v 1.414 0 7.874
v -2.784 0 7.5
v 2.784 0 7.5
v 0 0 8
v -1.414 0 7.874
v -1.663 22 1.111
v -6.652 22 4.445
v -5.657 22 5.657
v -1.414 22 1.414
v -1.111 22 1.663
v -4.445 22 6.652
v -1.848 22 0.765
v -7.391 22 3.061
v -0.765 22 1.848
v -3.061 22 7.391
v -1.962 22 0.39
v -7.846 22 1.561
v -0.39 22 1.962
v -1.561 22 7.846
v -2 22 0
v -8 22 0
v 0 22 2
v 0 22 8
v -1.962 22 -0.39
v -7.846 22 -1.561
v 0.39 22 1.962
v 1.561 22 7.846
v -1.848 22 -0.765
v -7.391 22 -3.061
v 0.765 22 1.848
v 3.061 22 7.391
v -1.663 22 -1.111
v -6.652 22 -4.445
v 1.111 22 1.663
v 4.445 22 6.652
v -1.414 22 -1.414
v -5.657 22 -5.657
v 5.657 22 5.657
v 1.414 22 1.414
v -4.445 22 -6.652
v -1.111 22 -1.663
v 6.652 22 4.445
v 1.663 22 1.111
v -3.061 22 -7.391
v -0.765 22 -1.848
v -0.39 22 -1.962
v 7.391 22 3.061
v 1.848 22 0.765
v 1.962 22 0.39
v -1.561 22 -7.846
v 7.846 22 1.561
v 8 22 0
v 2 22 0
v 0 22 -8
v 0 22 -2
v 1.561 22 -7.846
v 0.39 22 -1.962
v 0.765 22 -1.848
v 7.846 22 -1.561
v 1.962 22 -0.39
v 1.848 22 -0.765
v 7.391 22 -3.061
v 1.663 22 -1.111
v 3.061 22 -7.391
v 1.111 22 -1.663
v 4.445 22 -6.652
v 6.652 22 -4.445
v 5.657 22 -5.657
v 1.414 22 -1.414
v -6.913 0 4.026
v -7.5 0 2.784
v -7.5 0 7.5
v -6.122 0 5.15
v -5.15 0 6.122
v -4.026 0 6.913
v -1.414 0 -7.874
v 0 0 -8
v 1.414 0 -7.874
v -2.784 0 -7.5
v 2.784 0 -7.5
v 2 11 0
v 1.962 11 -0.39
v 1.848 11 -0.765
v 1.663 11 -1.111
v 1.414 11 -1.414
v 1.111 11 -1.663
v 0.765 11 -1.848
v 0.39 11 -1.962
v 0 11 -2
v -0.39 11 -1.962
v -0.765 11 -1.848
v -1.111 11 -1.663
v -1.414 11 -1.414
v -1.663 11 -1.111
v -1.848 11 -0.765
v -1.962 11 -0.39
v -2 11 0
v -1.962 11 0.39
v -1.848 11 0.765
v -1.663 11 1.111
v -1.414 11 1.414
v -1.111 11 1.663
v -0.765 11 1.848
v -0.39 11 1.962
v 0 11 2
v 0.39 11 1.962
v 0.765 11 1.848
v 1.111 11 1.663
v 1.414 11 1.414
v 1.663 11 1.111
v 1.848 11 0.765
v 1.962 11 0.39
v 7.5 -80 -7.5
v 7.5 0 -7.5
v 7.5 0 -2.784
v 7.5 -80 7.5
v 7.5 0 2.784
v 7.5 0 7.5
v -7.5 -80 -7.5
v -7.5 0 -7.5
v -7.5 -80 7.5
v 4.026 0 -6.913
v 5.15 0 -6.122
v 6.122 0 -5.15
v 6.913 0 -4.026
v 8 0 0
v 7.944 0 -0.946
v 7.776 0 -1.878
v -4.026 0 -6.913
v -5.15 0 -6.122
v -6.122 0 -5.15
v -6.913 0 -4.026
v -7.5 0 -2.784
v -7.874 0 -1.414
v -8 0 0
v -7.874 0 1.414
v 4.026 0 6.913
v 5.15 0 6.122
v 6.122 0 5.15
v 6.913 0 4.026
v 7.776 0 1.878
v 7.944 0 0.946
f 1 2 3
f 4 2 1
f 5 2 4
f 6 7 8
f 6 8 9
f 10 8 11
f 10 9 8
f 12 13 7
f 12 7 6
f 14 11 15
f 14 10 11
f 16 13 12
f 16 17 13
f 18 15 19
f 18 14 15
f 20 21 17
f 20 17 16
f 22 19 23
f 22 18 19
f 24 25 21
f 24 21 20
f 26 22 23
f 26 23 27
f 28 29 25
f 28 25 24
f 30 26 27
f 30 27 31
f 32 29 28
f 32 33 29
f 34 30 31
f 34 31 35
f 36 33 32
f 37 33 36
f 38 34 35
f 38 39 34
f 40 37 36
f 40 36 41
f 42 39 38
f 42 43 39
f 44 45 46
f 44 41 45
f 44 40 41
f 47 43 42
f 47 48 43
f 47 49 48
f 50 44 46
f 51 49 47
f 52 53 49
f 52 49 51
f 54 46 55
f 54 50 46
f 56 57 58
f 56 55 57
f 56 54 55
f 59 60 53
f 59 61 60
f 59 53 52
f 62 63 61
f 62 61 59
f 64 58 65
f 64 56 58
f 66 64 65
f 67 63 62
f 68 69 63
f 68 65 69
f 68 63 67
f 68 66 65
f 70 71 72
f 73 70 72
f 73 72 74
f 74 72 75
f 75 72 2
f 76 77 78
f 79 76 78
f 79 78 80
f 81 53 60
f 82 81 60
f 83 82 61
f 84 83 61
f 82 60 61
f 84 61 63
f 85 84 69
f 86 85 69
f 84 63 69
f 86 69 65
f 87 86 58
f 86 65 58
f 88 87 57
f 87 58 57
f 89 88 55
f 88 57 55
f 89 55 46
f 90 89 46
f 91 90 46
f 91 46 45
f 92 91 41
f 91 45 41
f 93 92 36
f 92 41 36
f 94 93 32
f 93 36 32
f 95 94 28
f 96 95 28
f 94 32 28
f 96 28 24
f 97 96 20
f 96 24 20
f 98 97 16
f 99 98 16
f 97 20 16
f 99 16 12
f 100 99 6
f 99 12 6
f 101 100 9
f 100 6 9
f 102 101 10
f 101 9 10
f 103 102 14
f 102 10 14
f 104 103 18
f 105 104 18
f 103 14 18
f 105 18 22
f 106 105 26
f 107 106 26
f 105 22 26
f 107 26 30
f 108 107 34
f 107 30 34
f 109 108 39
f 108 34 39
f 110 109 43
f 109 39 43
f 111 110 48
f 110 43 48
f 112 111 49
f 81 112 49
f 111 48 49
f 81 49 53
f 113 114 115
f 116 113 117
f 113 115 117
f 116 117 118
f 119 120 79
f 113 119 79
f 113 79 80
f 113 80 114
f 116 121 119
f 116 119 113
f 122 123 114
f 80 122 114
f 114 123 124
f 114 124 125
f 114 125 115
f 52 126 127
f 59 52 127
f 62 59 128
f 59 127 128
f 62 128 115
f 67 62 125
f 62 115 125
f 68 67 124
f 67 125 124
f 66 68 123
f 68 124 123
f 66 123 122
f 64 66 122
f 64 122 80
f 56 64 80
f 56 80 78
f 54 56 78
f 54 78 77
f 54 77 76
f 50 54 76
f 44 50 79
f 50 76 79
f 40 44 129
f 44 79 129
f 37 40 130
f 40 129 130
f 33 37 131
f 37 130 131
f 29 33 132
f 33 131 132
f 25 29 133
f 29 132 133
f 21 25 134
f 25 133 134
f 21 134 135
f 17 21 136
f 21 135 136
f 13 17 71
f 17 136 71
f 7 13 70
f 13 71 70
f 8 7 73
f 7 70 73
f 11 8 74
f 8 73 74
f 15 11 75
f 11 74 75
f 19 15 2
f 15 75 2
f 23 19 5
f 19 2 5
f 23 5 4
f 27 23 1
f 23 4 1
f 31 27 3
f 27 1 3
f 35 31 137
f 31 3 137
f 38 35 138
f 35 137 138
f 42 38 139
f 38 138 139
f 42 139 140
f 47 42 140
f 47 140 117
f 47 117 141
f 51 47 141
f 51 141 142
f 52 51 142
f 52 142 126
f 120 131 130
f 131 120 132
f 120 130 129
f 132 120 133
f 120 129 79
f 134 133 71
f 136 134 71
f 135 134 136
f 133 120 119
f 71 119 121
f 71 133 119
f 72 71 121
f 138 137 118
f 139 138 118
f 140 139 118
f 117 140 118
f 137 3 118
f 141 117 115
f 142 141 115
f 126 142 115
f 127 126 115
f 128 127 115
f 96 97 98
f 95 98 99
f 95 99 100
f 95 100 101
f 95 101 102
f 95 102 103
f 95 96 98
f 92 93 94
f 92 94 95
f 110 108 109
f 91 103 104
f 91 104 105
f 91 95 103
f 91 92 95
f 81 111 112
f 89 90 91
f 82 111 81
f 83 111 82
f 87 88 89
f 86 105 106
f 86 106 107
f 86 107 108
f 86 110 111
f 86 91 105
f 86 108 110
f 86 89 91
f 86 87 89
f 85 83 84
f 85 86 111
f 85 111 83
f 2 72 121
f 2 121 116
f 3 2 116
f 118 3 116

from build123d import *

# Parameters (mm, degrees)
SKETCH_1_R          = 8
EXTRUDE_1_DEPTH     = 22
SKETCH_2_W          = 15
SKETCH_2_H          = 15
EXTRUDE_2_DEPTH     = 80
SKETCH_3_R          = 2
CUT_EXTRUDE_1_DEPTH = 11


with BuildPart() as part:
    # 草图1 → 凸台-拉伸1 (new body)
    with BuildSketch(Plane(origin=(0, 0, 0), x_dir=(1, 0, 0), z_dir=(0, 1, 0))):
        Circle(SKETCH_1_R)
    extrude(amount=EXTRUDE_1_DEPTH)

    # 草图2 → 凸台-拉伸2 (add)
    with BuildSketch(Plane.XZ):
        Rectangle(SKETCH_2_W, SKETCH_2_H)
    extrude(amount=EXTRUDE_2_DEPTH)

    # 草图3 → 切除-拉伸1 (cut)
    with BuildSketch(Plane(origin=(0, 22, 0), x_dir=(1, 0, 0), z_dir=(0, 1, 0))):
        Circle(SKETCH_3_R)
    extrude(amount=-CUT_EXTRUDE_1_DEPTH, mode=Mode.SUBTRACT)


solid = part.part
